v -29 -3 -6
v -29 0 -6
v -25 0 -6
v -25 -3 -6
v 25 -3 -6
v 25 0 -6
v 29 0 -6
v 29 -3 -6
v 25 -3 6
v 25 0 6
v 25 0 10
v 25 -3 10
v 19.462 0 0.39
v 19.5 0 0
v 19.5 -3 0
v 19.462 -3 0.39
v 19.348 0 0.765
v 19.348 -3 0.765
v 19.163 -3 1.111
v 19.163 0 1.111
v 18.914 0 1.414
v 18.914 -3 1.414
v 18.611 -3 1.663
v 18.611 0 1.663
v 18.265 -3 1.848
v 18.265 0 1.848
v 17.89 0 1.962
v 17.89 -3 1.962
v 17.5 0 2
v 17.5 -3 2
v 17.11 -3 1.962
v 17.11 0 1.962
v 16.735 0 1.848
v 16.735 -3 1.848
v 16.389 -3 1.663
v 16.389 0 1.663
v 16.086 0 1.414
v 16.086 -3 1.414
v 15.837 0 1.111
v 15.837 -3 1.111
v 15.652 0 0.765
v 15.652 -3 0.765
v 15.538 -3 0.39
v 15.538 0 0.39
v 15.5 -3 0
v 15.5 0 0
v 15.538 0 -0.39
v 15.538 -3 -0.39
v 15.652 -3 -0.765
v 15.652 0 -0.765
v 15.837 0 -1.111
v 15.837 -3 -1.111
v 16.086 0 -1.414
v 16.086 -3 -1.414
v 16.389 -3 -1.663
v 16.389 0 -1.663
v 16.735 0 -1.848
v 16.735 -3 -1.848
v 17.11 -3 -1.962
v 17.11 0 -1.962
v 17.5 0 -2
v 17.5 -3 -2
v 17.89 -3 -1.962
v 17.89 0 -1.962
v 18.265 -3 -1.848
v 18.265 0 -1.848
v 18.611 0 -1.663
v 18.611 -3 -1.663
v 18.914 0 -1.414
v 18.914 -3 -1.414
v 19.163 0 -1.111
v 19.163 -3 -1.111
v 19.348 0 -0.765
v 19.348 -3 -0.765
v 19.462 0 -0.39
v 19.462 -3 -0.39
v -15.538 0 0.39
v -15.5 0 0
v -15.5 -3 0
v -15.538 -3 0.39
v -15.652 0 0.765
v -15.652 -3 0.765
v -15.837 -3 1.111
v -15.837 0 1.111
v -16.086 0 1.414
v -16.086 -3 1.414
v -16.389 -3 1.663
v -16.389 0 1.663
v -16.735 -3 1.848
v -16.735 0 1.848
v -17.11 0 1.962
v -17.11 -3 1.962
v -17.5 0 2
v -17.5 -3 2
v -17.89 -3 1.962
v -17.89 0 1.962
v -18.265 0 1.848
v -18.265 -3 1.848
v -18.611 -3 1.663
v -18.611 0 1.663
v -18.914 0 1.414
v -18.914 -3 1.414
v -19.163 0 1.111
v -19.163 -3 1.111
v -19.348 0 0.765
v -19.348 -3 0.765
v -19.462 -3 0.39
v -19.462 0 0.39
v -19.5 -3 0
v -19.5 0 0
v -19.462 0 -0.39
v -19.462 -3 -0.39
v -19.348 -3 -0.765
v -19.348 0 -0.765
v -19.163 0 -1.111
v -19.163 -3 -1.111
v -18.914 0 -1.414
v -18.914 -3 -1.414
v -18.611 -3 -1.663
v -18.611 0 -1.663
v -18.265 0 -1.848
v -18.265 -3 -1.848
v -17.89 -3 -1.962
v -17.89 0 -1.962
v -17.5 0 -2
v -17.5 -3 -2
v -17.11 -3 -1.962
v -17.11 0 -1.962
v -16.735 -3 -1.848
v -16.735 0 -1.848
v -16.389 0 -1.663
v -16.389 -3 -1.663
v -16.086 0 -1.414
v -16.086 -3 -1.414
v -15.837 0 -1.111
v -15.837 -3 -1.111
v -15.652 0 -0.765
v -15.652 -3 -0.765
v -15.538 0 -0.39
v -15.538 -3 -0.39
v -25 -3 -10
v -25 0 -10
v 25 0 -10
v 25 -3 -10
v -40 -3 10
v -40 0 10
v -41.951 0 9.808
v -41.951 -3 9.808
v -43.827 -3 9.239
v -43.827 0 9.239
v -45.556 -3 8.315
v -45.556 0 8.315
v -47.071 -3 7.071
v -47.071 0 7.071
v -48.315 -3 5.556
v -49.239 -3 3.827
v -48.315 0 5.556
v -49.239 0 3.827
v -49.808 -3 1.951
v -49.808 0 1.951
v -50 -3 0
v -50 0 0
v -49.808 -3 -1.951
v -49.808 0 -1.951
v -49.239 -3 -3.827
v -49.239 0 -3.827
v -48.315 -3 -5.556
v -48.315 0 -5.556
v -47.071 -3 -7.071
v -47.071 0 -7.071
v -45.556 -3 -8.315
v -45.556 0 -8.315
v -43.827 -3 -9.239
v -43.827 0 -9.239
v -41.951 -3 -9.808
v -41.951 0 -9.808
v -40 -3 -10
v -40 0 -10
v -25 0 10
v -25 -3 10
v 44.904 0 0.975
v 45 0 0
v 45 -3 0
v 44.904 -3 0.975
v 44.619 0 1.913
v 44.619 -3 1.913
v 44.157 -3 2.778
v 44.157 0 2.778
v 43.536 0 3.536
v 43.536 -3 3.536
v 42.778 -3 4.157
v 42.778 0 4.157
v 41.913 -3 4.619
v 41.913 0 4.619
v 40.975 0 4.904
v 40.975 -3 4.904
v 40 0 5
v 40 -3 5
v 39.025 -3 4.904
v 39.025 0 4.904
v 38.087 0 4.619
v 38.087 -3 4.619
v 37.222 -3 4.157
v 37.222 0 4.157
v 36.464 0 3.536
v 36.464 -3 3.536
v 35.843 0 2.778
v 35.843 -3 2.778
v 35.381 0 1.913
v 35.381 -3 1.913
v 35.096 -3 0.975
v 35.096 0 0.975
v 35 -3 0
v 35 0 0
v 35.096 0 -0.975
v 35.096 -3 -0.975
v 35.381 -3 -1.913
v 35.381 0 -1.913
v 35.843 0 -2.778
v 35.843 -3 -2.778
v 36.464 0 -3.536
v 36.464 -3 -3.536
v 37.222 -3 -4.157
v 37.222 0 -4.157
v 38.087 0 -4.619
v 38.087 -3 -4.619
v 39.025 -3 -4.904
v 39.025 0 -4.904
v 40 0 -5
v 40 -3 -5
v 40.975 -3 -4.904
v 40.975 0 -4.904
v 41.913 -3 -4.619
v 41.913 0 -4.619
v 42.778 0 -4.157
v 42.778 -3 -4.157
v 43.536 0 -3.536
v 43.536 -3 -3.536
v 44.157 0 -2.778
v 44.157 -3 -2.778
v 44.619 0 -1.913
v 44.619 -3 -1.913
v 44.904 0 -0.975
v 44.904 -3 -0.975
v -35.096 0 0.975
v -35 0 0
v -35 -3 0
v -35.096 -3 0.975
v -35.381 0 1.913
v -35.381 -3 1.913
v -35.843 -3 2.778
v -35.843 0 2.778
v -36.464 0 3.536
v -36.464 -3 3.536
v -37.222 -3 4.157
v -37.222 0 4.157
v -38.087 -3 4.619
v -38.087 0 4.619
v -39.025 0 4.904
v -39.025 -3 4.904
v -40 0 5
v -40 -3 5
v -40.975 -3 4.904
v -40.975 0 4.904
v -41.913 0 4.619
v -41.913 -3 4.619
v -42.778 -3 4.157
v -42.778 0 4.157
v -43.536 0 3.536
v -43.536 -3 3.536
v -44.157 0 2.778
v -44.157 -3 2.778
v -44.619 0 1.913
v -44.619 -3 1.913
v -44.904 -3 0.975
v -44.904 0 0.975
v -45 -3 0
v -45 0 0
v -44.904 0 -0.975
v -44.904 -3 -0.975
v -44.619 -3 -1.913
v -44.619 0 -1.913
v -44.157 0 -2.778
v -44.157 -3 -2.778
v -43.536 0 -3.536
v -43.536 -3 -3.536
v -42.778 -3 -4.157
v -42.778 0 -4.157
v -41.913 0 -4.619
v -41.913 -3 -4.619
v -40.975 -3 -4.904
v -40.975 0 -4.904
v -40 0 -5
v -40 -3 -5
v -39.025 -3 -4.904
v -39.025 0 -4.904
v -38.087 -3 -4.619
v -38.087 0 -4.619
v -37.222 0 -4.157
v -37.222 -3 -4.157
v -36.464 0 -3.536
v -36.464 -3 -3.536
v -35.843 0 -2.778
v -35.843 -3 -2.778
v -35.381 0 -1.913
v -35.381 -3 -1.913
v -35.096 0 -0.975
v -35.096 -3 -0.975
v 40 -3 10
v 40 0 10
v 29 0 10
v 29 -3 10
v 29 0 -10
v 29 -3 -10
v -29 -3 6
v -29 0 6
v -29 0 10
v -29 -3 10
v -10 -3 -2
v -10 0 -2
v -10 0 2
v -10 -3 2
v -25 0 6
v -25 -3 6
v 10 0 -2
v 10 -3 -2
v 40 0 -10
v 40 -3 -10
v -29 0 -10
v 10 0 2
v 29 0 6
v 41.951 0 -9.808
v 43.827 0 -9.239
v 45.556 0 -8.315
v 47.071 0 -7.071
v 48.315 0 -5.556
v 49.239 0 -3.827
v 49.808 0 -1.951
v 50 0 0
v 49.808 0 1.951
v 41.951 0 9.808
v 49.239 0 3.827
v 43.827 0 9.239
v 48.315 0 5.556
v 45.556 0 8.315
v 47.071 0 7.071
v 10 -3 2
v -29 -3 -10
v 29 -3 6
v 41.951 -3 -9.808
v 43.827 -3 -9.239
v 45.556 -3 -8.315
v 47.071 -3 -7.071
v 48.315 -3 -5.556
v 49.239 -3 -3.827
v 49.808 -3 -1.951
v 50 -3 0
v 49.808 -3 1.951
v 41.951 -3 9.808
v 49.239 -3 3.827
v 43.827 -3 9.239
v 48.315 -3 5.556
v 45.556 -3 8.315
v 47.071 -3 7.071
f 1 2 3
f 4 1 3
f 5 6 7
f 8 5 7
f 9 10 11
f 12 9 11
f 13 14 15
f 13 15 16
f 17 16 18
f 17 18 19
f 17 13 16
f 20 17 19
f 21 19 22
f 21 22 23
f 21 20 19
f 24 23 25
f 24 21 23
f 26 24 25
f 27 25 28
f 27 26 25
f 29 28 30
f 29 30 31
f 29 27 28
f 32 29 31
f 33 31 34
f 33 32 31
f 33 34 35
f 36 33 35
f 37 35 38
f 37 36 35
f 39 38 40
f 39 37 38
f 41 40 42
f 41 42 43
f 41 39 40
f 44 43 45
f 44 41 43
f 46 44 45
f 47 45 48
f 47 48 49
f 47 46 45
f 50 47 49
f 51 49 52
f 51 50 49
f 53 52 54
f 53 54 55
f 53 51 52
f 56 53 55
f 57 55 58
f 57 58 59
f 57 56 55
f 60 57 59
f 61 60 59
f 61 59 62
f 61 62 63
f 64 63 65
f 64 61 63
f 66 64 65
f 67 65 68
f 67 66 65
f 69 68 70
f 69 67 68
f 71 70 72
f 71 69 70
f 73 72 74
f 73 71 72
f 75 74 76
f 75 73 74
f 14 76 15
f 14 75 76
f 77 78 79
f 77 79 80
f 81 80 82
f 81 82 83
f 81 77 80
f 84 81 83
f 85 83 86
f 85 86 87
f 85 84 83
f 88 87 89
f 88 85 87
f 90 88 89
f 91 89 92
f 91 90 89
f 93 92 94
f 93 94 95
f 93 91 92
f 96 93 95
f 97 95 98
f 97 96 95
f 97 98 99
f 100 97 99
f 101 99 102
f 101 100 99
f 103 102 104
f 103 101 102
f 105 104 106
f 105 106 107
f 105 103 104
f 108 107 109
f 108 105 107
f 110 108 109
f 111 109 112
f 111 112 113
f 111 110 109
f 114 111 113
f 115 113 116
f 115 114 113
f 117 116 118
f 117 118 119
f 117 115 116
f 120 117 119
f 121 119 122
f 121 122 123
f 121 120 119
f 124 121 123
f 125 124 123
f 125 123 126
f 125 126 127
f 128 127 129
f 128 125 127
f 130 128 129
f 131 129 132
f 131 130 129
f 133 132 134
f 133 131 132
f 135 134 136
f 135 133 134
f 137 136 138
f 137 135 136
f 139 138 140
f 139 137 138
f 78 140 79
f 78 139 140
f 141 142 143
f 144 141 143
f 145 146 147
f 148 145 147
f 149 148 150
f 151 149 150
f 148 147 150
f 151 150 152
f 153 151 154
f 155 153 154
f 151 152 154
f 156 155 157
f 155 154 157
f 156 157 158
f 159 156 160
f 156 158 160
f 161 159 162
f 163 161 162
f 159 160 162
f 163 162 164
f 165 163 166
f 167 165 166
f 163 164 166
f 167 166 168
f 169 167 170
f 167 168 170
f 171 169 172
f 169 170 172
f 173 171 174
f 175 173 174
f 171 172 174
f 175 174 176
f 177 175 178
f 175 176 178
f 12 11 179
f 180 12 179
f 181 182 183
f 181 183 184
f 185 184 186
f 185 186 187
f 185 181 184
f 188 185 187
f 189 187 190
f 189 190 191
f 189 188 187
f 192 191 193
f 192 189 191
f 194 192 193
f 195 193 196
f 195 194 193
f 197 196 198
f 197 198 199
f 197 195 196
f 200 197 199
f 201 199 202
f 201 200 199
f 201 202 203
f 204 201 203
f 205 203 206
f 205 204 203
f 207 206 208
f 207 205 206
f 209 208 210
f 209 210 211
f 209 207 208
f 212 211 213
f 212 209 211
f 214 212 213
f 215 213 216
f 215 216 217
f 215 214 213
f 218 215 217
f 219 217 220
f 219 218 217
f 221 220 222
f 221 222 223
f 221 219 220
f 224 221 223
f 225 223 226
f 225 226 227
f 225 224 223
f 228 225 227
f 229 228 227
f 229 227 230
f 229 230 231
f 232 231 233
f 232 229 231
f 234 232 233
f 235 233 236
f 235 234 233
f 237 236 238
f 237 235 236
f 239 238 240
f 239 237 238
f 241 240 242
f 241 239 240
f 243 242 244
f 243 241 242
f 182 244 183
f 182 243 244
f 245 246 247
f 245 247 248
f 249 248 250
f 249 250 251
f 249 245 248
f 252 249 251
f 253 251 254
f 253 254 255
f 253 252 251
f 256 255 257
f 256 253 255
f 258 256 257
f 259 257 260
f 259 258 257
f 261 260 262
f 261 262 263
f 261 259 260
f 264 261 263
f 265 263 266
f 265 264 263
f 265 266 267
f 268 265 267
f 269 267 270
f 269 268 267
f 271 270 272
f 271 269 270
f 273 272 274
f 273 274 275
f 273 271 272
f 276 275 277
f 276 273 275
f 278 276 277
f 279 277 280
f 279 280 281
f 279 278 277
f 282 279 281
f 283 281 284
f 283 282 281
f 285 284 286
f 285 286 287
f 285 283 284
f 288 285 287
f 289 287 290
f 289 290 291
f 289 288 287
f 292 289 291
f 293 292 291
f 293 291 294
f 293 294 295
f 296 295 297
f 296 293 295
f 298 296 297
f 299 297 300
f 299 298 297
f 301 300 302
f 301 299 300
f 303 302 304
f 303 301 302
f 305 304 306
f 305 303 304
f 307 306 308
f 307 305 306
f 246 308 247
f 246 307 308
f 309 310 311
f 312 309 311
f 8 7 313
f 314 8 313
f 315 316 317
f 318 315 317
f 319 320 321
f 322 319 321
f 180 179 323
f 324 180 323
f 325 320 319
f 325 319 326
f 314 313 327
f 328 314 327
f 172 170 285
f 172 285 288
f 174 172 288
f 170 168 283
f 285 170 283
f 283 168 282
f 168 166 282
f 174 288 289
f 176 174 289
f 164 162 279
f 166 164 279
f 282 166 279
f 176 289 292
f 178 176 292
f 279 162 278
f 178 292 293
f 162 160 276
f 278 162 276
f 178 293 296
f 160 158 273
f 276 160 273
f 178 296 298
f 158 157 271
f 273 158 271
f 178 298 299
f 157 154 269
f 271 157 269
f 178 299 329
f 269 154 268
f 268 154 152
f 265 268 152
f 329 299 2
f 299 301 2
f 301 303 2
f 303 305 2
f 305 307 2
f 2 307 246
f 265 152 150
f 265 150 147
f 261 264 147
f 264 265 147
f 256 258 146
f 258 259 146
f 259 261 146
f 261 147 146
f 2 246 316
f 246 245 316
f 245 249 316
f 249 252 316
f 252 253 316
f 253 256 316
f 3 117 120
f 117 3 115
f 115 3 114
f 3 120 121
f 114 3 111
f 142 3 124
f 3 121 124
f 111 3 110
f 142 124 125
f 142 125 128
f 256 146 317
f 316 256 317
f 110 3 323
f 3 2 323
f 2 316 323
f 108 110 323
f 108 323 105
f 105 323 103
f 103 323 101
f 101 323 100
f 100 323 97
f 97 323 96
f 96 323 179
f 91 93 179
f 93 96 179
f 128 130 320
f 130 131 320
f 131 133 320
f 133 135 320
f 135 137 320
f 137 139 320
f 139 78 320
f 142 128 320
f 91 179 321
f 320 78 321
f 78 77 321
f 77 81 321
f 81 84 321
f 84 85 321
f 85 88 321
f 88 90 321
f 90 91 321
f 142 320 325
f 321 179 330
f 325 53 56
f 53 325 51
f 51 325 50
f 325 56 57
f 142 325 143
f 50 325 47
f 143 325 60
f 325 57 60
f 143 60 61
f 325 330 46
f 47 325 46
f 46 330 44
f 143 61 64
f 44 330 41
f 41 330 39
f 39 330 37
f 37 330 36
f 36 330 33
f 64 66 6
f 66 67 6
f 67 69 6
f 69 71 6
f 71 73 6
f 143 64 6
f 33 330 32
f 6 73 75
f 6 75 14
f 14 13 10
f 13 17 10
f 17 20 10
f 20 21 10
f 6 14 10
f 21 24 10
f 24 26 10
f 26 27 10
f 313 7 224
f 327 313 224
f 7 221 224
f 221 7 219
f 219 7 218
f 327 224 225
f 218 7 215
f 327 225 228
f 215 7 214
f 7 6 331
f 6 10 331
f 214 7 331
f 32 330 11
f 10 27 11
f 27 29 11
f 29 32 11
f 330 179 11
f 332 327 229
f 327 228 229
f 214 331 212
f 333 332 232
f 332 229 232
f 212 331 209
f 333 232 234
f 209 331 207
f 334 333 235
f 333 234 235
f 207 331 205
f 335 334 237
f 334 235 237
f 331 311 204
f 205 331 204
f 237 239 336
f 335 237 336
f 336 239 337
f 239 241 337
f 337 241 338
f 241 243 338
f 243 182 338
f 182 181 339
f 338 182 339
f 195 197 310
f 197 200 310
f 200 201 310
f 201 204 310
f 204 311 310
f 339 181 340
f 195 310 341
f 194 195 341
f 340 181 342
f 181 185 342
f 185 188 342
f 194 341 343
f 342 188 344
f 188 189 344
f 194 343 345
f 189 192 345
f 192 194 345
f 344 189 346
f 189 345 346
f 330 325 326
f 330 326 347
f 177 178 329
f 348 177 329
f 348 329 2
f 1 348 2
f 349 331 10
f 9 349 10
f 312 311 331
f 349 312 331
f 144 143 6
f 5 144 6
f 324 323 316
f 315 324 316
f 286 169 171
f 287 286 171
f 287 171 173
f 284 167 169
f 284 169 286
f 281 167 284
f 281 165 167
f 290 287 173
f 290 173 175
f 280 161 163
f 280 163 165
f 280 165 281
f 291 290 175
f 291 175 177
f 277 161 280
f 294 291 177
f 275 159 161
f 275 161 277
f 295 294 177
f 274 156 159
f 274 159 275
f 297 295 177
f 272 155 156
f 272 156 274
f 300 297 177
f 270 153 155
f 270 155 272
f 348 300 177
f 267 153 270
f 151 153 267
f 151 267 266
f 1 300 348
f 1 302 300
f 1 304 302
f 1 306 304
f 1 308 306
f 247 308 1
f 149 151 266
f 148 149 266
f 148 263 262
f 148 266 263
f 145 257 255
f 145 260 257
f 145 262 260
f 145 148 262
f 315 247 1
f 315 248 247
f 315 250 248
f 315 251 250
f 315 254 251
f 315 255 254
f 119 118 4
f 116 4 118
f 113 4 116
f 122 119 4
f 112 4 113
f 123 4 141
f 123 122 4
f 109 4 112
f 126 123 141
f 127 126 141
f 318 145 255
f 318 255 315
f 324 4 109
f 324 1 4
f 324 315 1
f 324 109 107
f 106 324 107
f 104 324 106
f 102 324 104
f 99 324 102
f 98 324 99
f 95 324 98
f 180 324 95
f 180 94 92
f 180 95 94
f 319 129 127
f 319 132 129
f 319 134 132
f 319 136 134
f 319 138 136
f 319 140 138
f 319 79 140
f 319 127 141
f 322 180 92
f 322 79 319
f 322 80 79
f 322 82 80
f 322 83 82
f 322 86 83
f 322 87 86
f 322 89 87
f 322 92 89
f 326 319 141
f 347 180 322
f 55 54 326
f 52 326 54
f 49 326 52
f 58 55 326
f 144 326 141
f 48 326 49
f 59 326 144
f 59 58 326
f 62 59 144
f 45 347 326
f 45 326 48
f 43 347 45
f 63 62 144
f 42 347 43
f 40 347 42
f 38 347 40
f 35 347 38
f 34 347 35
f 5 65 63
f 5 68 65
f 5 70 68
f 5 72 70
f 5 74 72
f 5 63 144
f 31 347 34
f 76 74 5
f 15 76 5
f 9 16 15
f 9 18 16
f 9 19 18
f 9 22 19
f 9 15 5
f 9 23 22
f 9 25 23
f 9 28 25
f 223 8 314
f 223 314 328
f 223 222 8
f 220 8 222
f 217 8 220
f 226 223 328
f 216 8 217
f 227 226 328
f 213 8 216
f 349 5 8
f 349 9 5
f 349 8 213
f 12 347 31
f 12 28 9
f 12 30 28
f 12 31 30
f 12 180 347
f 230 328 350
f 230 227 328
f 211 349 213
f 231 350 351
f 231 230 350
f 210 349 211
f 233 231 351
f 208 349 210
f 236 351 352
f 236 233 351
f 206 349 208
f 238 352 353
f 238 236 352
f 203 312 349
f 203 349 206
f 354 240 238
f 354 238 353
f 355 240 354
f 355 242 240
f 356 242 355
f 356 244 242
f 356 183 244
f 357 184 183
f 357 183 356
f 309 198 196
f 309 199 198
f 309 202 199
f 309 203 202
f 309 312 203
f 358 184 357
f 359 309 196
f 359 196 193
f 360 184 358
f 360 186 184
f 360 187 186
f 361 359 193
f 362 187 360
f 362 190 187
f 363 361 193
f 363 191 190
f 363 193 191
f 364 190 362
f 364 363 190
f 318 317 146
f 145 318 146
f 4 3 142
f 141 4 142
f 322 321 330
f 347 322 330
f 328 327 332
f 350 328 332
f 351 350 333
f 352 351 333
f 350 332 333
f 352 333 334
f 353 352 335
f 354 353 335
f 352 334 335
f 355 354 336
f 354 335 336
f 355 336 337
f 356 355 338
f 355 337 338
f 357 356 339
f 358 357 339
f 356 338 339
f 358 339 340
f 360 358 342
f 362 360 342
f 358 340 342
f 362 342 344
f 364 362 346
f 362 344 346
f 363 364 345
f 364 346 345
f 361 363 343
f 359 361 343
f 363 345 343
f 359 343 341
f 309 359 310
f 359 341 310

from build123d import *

# Parameters (mm, degrees)
F0_R     = 5
F0_R_2   = 2
F0_W     = 20
F0_H     = 4
F1_DEPTH = 3


with BuildPart() as f1:
    # F0 (on Front) → F1 (new body)
    with BuildSketch(Plane.XZ):
        with BuildLine():
            Line((-29, 10), (-40, 10))
            ThreePointArc((-40, 10), (-50, 0), (-40, -10))
            Line((-40, -10), (-29, -10))
            Line((-29, -10), (-29, -6))
            Line((-29, -6), (-25, -6))
            Line((-25, -6), (-25, -10))
            Line((-25, -10), (25, -10))
            Line((25, -10), (25, -6))
            Line((25, -6), (29, -6))
            Line((29, -6), (29, -10))
            Line((29, -10), (40, -10))
            ThreePointArc((40, -10), (50, 0), (40, 10))
            Line((40, 10), (29, 10))
            Line((29, 10), (29, 6))
            Line((29, 6), (25, 6))
            Line((25, 6), (25, 10))
            Line((25, 10), (-25, 10))
            Line((-25, 10), (-25, 6))
            Line((-25, 6), (-29, 6))
            Line((-29, 6), (-29, 10))
        make_face()
        with Locations((-40, 0)):
            Circle(F0_R, mode=Mode.SUBTRACT)
        with Locations((-17.5, 0)):
            Circle(F0_R_2, mode=Mode.SUBTRACT)
        Rectangle(F0_W, F0_H, mode=Mode.SUBTRACT)
        with Locations((17.5, 0)):
            Circle(F0_R_2, mode=Mode.SUBTRACT)
        with Locations((40, 0)):
            Circle(F0_R, mode=Mode.SUBTRACT)
    extrude(amount=F1_DEPTH)


solid = f1.part
